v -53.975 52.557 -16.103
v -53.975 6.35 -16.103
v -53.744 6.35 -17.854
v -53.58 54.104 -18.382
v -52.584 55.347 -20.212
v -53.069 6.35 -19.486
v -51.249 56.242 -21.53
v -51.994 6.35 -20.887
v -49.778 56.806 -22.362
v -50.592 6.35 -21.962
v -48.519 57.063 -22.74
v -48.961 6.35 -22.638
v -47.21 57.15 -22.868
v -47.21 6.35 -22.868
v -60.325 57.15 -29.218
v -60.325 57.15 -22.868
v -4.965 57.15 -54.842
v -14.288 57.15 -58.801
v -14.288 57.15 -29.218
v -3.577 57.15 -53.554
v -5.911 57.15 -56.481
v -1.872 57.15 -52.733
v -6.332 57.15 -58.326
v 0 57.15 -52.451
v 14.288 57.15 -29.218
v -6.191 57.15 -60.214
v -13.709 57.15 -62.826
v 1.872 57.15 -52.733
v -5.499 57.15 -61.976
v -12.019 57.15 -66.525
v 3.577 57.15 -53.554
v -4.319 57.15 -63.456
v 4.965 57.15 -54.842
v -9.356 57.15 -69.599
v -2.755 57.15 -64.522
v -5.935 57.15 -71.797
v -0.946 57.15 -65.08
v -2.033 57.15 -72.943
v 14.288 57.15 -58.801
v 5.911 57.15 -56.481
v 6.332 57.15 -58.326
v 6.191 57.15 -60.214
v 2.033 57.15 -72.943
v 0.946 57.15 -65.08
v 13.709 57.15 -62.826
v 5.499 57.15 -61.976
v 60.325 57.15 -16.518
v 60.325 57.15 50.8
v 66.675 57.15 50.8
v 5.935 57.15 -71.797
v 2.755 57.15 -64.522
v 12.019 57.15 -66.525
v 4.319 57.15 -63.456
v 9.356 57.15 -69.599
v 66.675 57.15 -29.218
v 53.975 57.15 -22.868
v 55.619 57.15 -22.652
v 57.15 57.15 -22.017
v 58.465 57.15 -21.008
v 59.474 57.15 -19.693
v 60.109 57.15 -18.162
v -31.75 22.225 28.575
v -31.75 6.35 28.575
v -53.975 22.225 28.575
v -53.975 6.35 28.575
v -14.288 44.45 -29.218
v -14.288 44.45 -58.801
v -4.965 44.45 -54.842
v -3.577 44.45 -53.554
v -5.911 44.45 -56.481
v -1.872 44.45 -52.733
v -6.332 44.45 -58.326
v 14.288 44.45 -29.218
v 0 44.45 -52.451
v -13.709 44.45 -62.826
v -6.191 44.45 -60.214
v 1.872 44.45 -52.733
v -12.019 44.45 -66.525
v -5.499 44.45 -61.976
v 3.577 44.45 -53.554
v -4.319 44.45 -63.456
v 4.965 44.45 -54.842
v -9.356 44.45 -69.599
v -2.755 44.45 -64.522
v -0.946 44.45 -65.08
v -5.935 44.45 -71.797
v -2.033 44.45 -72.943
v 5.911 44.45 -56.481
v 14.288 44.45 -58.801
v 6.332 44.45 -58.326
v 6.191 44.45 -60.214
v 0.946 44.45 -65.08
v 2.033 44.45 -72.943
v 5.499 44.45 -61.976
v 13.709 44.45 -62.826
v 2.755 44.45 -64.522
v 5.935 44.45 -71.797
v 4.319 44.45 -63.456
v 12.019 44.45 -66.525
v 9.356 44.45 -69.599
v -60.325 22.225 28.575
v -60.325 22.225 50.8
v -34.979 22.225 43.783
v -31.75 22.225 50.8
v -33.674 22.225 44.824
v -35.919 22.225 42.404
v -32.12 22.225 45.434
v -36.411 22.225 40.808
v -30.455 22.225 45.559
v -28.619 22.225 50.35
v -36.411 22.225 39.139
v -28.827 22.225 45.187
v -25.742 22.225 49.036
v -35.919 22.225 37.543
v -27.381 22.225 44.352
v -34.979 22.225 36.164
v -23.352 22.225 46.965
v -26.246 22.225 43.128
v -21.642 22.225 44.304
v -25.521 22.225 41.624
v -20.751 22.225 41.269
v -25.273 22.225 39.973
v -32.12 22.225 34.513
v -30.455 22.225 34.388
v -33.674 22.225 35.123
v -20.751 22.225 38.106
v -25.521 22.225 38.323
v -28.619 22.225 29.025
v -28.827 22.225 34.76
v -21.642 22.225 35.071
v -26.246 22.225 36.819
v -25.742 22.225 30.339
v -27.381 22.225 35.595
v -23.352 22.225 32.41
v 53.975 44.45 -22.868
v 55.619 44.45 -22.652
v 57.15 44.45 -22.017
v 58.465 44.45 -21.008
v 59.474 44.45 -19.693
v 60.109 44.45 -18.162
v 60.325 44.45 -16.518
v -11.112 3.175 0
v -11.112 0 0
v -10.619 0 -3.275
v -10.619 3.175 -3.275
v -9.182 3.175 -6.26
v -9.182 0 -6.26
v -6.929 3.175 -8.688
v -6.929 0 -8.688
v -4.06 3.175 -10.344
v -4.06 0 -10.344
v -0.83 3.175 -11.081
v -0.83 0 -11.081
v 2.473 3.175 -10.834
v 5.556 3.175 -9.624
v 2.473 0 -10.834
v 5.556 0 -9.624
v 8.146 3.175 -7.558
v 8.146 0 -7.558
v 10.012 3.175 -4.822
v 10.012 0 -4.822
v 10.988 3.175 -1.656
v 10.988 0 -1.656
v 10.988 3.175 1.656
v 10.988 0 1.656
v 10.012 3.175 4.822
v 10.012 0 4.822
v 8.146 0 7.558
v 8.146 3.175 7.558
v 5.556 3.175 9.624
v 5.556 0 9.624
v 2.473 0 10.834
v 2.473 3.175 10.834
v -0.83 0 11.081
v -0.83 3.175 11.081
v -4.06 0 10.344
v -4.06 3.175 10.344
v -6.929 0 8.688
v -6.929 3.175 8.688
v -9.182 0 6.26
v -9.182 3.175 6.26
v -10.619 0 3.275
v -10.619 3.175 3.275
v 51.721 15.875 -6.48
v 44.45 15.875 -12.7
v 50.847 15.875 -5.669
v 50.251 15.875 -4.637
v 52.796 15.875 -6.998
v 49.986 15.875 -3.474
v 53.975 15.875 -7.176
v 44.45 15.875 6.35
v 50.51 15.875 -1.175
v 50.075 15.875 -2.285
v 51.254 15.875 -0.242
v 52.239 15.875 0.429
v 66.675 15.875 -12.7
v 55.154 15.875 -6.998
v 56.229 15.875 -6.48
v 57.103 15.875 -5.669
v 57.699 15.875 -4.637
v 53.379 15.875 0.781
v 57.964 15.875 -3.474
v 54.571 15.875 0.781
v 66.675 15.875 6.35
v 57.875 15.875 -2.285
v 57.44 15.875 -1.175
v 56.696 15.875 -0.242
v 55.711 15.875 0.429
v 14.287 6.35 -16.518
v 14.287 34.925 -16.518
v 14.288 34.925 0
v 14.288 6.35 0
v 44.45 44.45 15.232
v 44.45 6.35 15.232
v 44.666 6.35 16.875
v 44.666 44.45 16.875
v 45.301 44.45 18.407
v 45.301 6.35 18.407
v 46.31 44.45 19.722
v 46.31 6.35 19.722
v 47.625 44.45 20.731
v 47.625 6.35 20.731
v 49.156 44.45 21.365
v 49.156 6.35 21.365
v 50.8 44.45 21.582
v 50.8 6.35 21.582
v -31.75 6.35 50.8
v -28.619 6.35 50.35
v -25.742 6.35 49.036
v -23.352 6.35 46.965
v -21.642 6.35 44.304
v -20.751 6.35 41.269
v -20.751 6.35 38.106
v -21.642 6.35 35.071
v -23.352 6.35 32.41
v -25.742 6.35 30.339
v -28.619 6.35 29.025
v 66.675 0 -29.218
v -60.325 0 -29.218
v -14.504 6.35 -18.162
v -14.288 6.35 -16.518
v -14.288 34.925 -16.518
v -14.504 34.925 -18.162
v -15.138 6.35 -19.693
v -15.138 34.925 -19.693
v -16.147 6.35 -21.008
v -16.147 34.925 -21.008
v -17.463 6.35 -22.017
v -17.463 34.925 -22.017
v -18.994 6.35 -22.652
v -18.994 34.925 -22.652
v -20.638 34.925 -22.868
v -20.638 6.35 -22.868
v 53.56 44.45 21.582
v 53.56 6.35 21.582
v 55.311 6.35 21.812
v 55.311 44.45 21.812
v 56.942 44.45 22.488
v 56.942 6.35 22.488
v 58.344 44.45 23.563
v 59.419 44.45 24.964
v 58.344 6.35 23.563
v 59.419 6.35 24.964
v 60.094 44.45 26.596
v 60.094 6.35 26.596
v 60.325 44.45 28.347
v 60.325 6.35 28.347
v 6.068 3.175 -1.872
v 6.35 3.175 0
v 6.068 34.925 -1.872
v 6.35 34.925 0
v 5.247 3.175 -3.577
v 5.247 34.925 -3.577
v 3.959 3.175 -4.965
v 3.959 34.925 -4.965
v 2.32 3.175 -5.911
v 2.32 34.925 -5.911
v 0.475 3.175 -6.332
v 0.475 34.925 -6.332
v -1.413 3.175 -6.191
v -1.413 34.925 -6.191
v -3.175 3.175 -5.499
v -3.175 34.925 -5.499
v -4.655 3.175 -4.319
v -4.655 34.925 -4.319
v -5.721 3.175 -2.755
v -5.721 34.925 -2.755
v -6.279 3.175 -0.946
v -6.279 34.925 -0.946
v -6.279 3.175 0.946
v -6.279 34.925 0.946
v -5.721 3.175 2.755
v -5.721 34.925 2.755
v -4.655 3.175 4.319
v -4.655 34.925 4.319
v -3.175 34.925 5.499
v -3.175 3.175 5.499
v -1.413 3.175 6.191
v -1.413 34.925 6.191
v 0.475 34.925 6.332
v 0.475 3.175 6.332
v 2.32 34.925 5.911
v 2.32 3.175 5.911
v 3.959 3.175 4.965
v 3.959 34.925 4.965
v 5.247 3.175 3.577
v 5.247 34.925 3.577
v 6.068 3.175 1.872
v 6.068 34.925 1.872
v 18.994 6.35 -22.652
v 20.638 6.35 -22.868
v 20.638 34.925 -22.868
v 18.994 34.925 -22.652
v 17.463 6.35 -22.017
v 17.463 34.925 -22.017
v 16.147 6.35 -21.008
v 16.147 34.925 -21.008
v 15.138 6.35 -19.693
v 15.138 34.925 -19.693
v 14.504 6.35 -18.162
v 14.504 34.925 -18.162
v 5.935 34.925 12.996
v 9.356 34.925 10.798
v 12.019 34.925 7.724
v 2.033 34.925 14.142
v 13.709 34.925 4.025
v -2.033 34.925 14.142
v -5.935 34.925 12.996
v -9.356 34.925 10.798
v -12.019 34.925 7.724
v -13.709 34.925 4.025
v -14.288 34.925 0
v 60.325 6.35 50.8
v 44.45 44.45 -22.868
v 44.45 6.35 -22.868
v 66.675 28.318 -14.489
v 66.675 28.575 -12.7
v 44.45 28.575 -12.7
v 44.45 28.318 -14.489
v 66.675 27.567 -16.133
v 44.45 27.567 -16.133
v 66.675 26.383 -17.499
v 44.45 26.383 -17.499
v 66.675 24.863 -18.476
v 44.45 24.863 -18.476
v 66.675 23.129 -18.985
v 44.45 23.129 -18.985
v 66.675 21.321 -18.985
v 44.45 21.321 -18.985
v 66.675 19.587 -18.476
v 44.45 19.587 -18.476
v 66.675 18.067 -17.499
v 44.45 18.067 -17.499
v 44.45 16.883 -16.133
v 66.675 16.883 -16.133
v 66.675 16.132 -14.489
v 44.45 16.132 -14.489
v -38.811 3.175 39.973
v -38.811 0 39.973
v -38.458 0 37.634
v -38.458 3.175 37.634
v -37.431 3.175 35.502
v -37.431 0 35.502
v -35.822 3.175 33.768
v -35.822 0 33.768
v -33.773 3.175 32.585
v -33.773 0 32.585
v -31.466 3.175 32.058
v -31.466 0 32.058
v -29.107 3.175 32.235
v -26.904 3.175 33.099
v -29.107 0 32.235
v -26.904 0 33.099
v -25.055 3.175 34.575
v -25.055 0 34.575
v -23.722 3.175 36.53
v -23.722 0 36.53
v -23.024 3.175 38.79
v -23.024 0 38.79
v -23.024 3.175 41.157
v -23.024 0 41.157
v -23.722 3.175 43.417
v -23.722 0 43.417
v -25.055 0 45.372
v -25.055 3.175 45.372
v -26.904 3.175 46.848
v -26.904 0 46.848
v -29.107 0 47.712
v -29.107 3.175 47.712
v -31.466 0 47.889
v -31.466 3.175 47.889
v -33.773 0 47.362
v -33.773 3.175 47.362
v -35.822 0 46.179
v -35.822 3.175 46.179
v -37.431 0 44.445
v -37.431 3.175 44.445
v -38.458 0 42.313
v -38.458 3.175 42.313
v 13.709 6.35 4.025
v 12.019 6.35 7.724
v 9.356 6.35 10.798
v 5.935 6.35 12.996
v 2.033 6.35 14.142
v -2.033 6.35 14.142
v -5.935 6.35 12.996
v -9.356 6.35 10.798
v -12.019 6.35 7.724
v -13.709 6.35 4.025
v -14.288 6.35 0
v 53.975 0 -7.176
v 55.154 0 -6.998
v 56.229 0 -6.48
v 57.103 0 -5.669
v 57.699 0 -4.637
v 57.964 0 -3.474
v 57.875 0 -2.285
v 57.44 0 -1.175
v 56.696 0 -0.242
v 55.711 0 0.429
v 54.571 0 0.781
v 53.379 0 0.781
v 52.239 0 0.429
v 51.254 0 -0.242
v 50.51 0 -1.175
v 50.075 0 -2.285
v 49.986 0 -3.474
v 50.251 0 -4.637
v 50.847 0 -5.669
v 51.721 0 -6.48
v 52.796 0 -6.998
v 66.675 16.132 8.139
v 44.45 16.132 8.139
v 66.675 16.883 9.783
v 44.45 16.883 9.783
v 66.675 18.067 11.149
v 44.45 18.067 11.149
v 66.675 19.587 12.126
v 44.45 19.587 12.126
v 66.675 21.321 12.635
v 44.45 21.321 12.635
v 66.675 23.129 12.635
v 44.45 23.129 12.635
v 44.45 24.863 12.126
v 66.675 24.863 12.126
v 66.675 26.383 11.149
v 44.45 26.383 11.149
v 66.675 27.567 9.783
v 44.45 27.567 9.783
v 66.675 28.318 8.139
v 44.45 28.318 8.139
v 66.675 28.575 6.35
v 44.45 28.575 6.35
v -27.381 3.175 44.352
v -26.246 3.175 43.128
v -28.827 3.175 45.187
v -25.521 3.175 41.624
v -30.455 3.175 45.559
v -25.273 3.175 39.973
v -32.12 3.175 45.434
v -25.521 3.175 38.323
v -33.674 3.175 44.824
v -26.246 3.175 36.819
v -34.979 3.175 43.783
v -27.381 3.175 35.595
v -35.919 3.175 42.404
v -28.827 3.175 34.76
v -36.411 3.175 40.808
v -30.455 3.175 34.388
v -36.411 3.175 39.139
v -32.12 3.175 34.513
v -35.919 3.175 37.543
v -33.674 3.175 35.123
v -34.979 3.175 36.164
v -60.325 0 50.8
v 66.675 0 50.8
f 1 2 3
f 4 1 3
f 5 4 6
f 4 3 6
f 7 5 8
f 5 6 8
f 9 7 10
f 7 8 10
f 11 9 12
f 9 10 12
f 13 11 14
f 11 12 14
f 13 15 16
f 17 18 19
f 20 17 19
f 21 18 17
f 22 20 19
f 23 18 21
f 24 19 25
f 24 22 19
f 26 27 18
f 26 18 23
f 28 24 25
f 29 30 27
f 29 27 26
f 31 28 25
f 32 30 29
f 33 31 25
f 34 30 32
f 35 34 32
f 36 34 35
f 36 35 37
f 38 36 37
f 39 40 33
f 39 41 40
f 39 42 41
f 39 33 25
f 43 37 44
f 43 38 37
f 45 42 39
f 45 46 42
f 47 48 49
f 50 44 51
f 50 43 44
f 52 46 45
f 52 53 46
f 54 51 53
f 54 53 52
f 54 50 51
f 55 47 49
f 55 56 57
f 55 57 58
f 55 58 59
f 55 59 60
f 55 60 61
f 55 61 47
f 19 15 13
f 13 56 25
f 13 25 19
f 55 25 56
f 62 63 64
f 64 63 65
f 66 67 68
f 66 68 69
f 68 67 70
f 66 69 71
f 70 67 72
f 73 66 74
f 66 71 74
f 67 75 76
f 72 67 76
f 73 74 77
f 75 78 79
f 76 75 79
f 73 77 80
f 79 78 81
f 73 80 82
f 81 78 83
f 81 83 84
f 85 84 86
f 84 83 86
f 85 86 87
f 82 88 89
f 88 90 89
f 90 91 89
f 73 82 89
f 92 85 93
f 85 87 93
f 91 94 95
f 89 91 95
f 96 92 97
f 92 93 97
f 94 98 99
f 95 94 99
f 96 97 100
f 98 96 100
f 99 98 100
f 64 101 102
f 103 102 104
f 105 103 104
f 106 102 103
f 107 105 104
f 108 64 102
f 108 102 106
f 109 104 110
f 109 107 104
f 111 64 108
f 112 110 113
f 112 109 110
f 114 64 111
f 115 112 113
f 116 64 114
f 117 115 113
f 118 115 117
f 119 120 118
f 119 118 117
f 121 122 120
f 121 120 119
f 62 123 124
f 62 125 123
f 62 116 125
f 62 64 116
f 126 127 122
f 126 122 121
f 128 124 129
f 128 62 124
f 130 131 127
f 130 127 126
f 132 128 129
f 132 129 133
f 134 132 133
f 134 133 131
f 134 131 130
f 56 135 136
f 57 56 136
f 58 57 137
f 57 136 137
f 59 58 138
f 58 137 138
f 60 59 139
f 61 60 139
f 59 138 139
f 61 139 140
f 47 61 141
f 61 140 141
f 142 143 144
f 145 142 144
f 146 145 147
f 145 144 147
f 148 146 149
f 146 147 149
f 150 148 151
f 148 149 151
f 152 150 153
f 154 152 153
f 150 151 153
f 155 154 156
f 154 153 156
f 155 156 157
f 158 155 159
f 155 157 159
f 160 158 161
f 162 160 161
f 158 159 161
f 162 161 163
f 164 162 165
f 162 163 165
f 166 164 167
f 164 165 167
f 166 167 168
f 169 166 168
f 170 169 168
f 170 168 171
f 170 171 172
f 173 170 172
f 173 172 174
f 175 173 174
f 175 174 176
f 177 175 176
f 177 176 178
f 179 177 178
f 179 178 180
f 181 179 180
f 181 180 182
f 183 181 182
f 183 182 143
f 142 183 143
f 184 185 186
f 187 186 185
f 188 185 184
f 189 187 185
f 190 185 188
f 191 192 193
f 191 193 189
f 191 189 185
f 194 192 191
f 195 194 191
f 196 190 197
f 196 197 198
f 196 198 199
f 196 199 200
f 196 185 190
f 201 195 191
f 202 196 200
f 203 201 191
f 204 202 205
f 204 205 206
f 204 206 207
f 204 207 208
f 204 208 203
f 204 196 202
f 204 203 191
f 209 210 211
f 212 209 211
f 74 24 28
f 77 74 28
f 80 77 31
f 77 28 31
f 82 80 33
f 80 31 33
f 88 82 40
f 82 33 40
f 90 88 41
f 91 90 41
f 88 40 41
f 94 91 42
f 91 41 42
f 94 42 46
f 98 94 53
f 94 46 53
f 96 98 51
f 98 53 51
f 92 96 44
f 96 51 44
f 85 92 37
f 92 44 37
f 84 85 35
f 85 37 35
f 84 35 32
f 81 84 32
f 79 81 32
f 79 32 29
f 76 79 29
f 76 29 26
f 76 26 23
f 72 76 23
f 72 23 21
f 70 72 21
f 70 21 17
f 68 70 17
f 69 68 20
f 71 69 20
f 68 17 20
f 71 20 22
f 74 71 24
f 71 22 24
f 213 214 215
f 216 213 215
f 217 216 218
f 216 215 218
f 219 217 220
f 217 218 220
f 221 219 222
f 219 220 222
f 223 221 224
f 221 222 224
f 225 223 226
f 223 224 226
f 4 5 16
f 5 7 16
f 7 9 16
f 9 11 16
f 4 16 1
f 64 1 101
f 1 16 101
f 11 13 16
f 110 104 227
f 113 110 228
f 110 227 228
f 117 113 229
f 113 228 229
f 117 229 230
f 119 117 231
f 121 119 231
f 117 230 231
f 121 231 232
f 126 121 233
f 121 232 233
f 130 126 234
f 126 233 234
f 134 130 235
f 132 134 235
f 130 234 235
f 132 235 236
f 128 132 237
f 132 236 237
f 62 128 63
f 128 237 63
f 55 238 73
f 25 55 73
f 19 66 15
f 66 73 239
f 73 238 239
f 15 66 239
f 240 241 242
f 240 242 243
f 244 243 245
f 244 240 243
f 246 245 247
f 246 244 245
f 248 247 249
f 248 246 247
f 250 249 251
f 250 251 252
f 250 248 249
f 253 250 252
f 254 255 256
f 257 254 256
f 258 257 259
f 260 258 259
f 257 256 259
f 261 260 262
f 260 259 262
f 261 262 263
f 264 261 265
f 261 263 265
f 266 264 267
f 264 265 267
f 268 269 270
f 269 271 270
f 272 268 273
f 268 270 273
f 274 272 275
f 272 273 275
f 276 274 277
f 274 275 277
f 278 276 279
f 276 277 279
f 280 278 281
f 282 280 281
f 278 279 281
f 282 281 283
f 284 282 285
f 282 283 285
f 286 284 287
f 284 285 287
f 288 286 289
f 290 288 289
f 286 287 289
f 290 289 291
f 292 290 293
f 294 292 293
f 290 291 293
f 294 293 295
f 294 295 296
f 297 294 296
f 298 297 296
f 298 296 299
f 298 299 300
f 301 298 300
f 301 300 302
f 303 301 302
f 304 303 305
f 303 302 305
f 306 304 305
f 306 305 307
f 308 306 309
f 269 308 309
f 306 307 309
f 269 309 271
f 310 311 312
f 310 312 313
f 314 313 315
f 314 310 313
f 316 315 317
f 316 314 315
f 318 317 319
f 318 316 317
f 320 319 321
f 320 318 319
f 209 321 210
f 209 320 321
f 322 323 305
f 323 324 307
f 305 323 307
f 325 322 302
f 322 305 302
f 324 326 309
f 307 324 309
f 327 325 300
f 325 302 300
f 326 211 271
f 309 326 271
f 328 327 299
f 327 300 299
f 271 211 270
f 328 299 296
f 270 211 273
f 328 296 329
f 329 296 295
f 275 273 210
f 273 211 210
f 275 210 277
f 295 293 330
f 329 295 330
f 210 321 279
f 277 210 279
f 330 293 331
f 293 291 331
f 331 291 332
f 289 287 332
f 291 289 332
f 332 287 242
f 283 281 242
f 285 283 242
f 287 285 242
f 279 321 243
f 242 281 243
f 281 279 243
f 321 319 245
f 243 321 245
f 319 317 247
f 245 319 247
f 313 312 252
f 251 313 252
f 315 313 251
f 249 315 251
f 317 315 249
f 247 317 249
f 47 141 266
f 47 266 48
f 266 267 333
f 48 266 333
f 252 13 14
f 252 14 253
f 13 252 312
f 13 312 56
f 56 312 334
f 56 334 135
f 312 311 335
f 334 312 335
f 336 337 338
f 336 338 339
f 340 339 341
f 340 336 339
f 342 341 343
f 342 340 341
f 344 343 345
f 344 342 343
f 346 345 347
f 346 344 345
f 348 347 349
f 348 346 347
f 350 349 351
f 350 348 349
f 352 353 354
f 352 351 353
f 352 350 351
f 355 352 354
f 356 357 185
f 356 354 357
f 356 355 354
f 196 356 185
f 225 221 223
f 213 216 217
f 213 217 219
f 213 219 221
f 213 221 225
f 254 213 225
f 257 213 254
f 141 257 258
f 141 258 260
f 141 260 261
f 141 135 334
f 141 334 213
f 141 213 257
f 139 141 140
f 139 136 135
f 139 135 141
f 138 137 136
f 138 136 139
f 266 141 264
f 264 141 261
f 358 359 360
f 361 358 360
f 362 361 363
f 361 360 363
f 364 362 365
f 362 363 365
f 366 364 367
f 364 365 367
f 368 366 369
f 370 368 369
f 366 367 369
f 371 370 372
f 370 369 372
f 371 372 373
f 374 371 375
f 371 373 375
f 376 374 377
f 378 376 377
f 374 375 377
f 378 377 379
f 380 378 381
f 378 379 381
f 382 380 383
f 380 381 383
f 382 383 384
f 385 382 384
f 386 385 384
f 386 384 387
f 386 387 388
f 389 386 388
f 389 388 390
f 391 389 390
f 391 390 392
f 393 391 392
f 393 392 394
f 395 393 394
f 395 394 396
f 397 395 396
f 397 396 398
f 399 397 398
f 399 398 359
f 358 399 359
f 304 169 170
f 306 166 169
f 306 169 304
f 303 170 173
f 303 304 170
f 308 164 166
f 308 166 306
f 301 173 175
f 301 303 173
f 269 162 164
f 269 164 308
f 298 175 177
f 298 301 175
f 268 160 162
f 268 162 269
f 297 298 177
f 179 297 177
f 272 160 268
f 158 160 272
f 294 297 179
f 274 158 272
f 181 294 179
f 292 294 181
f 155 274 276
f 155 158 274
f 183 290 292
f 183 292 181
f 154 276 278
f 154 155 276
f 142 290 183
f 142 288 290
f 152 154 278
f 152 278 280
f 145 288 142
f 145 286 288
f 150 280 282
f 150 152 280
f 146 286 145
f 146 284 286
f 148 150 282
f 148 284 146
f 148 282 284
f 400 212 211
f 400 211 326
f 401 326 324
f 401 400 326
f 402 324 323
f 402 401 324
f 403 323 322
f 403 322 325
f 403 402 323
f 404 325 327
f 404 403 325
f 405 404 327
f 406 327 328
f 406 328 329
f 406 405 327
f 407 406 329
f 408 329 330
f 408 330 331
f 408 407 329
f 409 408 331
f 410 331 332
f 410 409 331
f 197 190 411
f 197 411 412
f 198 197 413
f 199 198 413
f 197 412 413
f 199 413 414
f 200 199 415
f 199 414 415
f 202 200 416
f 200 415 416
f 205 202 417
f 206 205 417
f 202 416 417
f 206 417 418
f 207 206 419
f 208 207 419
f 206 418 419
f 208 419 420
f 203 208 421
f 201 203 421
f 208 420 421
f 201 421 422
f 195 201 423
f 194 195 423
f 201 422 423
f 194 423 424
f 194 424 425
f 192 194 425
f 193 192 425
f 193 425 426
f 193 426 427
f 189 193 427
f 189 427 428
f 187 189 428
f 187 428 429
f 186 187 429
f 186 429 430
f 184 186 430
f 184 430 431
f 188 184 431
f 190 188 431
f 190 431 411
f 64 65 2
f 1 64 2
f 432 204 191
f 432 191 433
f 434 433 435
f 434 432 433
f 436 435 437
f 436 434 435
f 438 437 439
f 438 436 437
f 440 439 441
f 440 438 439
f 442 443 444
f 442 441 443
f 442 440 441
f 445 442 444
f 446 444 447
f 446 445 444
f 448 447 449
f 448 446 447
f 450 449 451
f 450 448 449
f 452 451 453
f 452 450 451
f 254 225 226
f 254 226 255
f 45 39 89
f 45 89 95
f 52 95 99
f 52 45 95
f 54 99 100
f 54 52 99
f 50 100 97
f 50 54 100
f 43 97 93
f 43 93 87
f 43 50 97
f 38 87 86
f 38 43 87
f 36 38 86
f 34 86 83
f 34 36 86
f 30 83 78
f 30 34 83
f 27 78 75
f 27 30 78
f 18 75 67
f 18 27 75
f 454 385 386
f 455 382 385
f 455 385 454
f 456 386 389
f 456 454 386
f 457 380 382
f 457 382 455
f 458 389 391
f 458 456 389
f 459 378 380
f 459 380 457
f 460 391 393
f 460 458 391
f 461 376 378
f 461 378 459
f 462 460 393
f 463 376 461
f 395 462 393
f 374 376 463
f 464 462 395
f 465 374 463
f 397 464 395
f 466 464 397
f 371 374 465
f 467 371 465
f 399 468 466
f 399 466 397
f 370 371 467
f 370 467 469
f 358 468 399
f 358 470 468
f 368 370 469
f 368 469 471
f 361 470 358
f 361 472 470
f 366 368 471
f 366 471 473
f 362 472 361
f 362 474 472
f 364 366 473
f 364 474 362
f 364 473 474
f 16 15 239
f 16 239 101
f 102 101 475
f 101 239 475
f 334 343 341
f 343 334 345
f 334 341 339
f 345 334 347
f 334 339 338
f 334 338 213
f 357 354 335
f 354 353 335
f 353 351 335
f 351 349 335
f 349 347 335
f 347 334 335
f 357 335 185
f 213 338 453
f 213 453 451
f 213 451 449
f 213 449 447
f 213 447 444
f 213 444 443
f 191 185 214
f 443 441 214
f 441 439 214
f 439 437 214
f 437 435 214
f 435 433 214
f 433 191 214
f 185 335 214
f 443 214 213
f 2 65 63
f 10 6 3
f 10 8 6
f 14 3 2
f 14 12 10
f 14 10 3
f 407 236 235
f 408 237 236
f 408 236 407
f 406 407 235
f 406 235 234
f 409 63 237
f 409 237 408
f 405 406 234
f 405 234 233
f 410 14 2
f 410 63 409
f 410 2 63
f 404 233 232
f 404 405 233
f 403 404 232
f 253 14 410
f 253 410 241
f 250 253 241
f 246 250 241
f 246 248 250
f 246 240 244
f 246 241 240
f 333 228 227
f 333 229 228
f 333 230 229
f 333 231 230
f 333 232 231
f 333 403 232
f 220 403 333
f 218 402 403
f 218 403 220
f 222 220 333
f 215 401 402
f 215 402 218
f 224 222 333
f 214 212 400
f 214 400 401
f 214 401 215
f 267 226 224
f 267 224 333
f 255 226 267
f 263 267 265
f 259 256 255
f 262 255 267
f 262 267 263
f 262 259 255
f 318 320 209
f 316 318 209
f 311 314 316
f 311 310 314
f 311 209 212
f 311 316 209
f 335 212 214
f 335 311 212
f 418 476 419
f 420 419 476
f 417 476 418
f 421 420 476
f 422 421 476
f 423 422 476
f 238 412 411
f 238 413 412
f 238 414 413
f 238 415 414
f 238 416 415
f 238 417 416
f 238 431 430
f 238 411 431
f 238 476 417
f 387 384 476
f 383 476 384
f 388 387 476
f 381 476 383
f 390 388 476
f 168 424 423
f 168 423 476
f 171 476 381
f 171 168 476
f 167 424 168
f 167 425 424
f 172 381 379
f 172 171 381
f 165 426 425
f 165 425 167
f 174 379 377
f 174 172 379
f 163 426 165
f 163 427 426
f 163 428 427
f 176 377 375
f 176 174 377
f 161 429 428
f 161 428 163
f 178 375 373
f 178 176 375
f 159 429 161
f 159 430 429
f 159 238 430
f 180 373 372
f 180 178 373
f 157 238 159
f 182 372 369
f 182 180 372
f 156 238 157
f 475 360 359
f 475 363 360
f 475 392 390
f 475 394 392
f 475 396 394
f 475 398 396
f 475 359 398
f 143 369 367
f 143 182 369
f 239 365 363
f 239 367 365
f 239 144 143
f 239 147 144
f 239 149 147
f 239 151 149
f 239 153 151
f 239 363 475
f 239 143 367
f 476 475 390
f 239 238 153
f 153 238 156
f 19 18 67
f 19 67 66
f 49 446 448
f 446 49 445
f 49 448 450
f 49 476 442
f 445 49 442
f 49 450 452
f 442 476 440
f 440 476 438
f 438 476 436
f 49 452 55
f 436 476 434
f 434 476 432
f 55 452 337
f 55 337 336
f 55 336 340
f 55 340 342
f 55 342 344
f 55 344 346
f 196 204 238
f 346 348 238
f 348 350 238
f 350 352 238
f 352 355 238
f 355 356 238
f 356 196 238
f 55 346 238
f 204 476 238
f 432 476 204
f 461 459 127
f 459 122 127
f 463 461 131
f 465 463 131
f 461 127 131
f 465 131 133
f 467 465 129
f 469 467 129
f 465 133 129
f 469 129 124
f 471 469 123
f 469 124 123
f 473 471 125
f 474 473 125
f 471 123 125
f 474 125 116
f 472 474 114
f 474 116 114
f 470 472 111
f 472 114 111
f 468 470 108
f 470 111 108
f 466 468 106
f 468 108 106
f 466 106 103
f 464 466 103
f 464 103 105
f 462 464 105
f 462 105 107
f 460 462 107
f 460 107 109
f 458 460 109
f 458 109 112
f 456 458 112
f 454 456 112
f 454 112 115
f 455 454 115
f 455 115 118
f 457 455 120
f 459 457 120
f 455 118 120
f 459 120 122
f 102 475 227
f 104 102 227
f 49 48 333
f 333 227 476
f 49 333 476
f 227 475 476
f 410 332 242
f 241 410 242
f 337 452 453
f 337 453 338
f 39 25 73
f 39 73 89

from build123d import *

# Parameters (mm, degrees)
BOSS_EXTRUDE1_DEPTH                                  = 6.35
BOSS_EXTRUDE2_DEPTH                                  = 57.15
BOSS_EXTRUDE3_DEPTH                                  = 44.45
BOSS_EXTRUDE4_DEPTH                                  = 34.925
SKETCH4_R                                            = 14.2875
SKETCH4_R_2                                          = 6.35
BOSS_EXTRUDE5_DEPTH                                  = 12.7
CUT_EXTRUDE1_REACH                                   = 159.28
BOSS_EXTRUDE6_DEPTH                                  = 15.875
CBORE_FOR_M5_CROSS_RECESS_PAN_HEAD_SCREW_D           = 11.2014
CBORE_FOR_M5_CROSS_RECESS_PAN_HEAD_SCREW_CBORE_D     = 15.875
CBORE_FOR_M5_CROSS_RECESS_PAN_HEAD_SCREW_CBORE_DEPTH = 3.175
CBORE_FOR_M5_CROSS_RECESS_PAN_HEAD_S_2_D             = 12.7
CBORE_FOR_M5_CROSS_RECESS_PAN_HEAD_S_2_CBORE_D       = 22.225
CBORE_FOR_M5_CROSS_RECESS_PAN_HEAD_S_2_CBORE_DEPTH   = 3.175
CUT_EXTRUDE3_REACH                                   = 159.28
CUT_EXTRUDE4_REACH                                   = 116.252
SKETCH18_R                                           = 4.0005


with BuildPart() as part:
    # Sketch1 → Boss-Extrude1 (new body)
    with BuildSketch(Plane(origin=(0, 0, 0), x_dir=(1, 0, 0), z_dir=(0, 1, 0))):
        with BuildLine():
            Line((60.325, 16.51822322), (60.325, -28.346886894))
            Line((60.325, -28.346886894), (60.325, -50.8))
            Line((60.325, -50.8), (66.675, -50.8))
            Line((66.675, -50.8), (66.675, 29.21822322))
            Line((66.675, 29.21822322), (-60.325, 29.21822322))
            Line((-60.325, 29.21822322), (-60.325, -50.8))
            Line((-60.325, -50.8), (-53.975, -50.8))
            Line((-53.975, -50.8), (-53.975, -44.45))
            Line((-53.975, -44.45), (-53.975, 16.103113106))
            ThreePointArc((-53.975, 16.103113106), (-51.993545123, 20.886768343), (-47.209889886, 22.86822322))
            Line((-47.209889886, 22.86822322), (-20.6375, 22.86822322))
            Line((-20.6375, 22.86822322), (20.6375, 22.86822322))
            Line((20.6375, 22.86822322), (44.45, 22.86822322))
            Line((44.45, 22.86822322), (53.975, 22.86822322))
            ThreePointArc((53.975, 22.86822322), (58.465128061, 21.00835128), (60.325, 16.51822322))
        make_face()
        with BuildLine():
            Line((60.325, -50.8), (60.325, -28.346886894))
            ThreePointArc((60.325, -28.346886894), (58.343545123, -23.563231657), (53.559889886, -21.58177678))
            Line((53.559889886, -21.58177678), (50.8, -21.58177678))
            ThreePointArc((50.8, -21.58177678), (46.309871939, -19.721904841), (44.45, -15.23177678))
            Line((44.45, -15.23177678), (44.45, 22.86822322))
            Line((44.45, 22.86822322), (20.6375, 22.86822322))
            ThreePointArc((20.6375, 22.86822322), (16.147371939, 21.00835128), (14.2875, 16.51822322))
            Line((14.2875, 16.51822322), (14.2875, 0))
            ThreePointArc((14.2875, 0), (0, -14.2875), (-14.2875, 0))
            Line((-14.2875, 0), (-14.2875, 16.51822322))
            ThreePointArc((-14.2875, 16.51822322), (-16.147371939, 21.00835128), (-20.6375, 22.86822322))
            Line((-20.6375, 22.86822322), (-47.209889886, 22.86822322))
            ThreePointArc((-47.209889886, 22.86822322), (-51.993545123, 20.886768343), (-53.975, 16.103113106))
            Line((-53.975, 16.103113106), (-53.975, -44.45))
            Line((-53.975, -44.45), (-53.975, -50.8))
            Line((-53.975, -50.8), (-47.625, -50.8))
            Line((-47.625, -50.8), (60.325, -50.8))
        make_face()
        with BuildLine():
            Line((-20.6375, 22.86822322), (20.6375, 22.86822322))
            ThreePointArc((20.6375, 22.86822322), (16.147371939, 21.00835128), (14.2875, 16.51822322))
            Line((14.2875, 16.51822322), (14.2875, 0))
            ThreePointArc((14.2875, 0), (0, -14.2875), (-14.2875, 0))
            Line((-14.2875, 0), (-14.2875, 16.51822322))
            ThreePointArc((-14.2875, 16.51822322), (-16.147371939, 21.00835128), (-20.6375, 22.86822322))
        make_face()
        with BuildLine():
            ThreePointArc((53.559889886, -21.58177678), (58.343545123, -23.563231657), (60.325, -28.346886894))
            Line((60.325, -28.346886894), (60.325, 16.51822322))
            ThreePointArc((60.325, 16.51822322), (58.465128061, 21.00835128), (53.975, 22.86822322))
            Line((53.975, 22.86822322), (44.45, 22.86822322))
            Line((44.45, 22.86822322), (44.45, -15.23177678))
            ThreePointArc((44.45, -15.23177678), (46.309871939, -19.721904841), (50.8, -21.58177678))
            Line((50.8, -21.58177678), (53.559889886, -21.58177678))
        make_face()
    extrude(amount=BOSS_EXTRUDE1_DEPTH)

    # Sketch1<4> → Boss-Extrude2 (add)
    with BuildSketch(Plane(origin=(0, 0, 0), x_dir=(1, 0, 0), z_dir=(0, 1, 0))):
        with BuildLine():
            Line((60.325, 16.51822322), (60.325, -28.346886894))
            Line((60.325, -28.346886894), (60.325, -50.8))
            Line((60.325, -50.8), (66.675, -50.8))
            Line((66.675, -50.8), (66.675, 29.21822322))
            Line((66.675, 29.21822322), (-60.325, 29.21822322))
            Line((-60.325, 29.21822322), (-60.325, -50.8))
            Line((-60.325, -50.8), (-53.975, -50.8))
            Line((-53.975, -50.8), (-53.975, -44.45))
            Line((-53.975, -44.45), (-53.975, 16.103113106))
            ThreePointArc((-53.975, 16.103113106), (-51.993545123, 20.886768343), (-47.209889886, 22.86822322))
            Line((-47.209889886, 22.86822322), (-20.6375, 22.86822322))
            Line((-20.6375, 22.86822322), (20.6375, 22.86822322))
            Line((20.6375, 22.86822322), (44.45, 22.86822322))
            Line((44.45, 22.86822322), (53.975, 22.86822322))
            ThreePointArc((53.975, 22.86822322), (58.465128061, 21.00835128), (60.325, 16.51822322))
        make_face()
    extrude(amount=BOSS_EXTRUDE2_DEPTH)

    # Sketch1<5> → Boss-Extrude3 (add)
    with BuildSketch(Plane(origin=(0, 0, 0), x_dir=(1, 0, 0), z_dir=(0, 1, 0))):
        with BuildLine():
            ThreePointArc((53.559889886, -21.58177678), (58.343545123, -23.563231657), (60.325, -28.346886894))
            Line((60.325, -28.346886894), (60.325, 16.51822322))
            ThreePointArc((60.325, 16.51822322), (58.465128061, 21.00835128), (53.975, 22.86822322))
            Line((53.975, 22.86822322), (44.45, 22.86822322))
            Line((44.45, 22.86822322), (44.45, -15.23177678))
            ThreePointArc((44.45, -15.23177678), (46.309871939, -19.721904841), (50.8, -21.58177678))
            Line((50.8, -21.58177678), (53.559889886, -21.58177678))
        make_face()
    extrude(amount=BOSS_EXTRUDE3_DEPTH)

    # Sketch1<6> → Boss-Extrude4 (add)
    with BuildSketch(Plane(origin=(0, 0, 0), x_dir=(1, 0, 0), z_dir=(0, 1, 0))):
        with BuildLine():
            Line((-20.6375, 22.86822322), (20.6375, 22.86822322))
            ThreePointArc((20.6375, 22.86822322), (16.147371939, 21.00835128), (14.2875, 16.51822322))
            Line((14.2875, 16.51822322), (14.2875, 0))
            ThreePointArc((14.2875, 0), (0, -14.2875), (-14.2875, 0))
            Line((-14.2875, 0), (-14.2875, 16.51822322))
            ThreePointArc((-14.2875, 16.51822322), (-16.147371939, 21.00835128), (-20.6375, 22.86822322))
        make_face()
    extrude(amount=BOSS_EXTRUDE4_DEPTH)

    # Sketch4 → Boss-Extrude5 (add)
    # profile 1 of 2: a face of its own
    with BuildSketch(Plane(origin=(0, 57.15, 0), x_dir=(1, 0, 0), z_dir=(0, 1, 0))):
        with BuildLine():
            ThreePointArc((14.2875, 58.801), (0, 44.5135), (-14.2875, 58.801))
            Line((-14.2875, 58.801), (-14.2875, 29.21822322))
            Line((-14.2875, 29.21822322), (14.2875, 29.21822322))
            Line((14.2875, 29.21822322), (14.2875, 58.801))
        make_face()
    # profile 2 of 2: a face of its own
    with BuildSketch(Plane(origin=(0, 57.15, 0), x_dir=(1, 0, 0), z_dir=(0, 1, 0))):
        with Locations((0, 58.801)):
            Circle(SKETCH4_R)
        with Locations(Location((0, 58.801, 0), (0, 0, 270))):
            Circle(SKETCH4_R_2, mode=Mode.SUBTRACT)
    extrude(amount=-BOSS_EXTRUDE5_DEPTH)

    # Sketch5 → Cut-Extrude1 (cut, up to next)
    with BuildSketch(Plane.ZY.offset(60.325), mode=Mode.PRIVATE) as cut_extrude1_sk1:
        Polygon((-22.86822322, 57.15), (28.575, 22.225), (50.8, 22.225), (50.8, 57.15), align=None)
    cut_extrude1_tool1 = extrude(cut_extrude1_sk1.sketch, amount=-CUT_EXTRUDE1_REACH, mode=Mode.PRIVATE) & part.part
    add(cut_extrude1_tool1.solids().sort_by_distance((-60.325, 42.810165, 24.526909))[0], mode=Mode.SUBTRACT)

    # Sketch6 → Boss-Extrude6 (add)
    with BuildSketch(Plane(origin=(0, 6.35, 0), x_dir=(1, 0, 0), z_dir=(0, 1, 0))):
        with BuildLine():
            Line((-31.75, -28.575), (-53.975, -28.575))
            Line((-53.975, -28.575), (-53.975, -50.8))
            Line((-53.975, -50.8), (-31.75, -50.8))
            ThreePointArc((-31.75, -50.8), (-20.6375, -39.6875), (-31.75, -28.575))
        make_face()
    extrude(amount=BOSS_EXTRUDE6_DEPTH)

    # CBORE for M5 Cross Recess Pan Head Screw (through all)
    with Locations(Plane(origin=(0, 0, 0), x_dir=(-1, 0, 0), z_dir=(0, -1, 0))):
        with Locations((30.873227599, -39.973489035)):
            CounterBoreHole(CBORE_FOR_M5_CROSS_RECESS_PAN_HEAD_SCREW_D / 2, CBORE_FOR_M5_CROSS_RECESS_PAN_HEAD_SCREW_CBORE_D / 2, CBORE_FOR_M5_CROSS_RECESS_PAN_HEAD_SCREW_CBORE_DEPTH)

    # CBORE for M5 Cross Recess Pan Head S 2 (through all)
    with Locations(Plane(origin=(0, 0, 0), x_dir=(-1, 0, 0), z_dir=(0, -1, 0))):
        with Locations((0, 0)):
            CounterBoreHole(CBORE_FOR_M5_CROSS_RECESS_PAN_HEAD_S_2_D / 2, CBORE_FOR_M5_CROSS_RECESS_PAN_HEAD_S_2_CBORE_D / 2, CBORE_FOR_M5_CROSS_RECESS_PAN_HEAD_S_2_CBORE_DEPTH)

    # Sketch16 → Cut-Extrude3 (cut, up to next)
    with BuildSketch(Plane(origin=(66.675, 0, 0), x_dir=(0, 0, -1), z_dir=(1, 0, 0)), mode=Mode.PRIVATE) as cut_extrude3_sk1:
        with BuildLine():
            Line((-6.35, 28.575), (12.7, 28.575))
            ThreePointArc((12.7, 28.575), (19.05, 22.225), (12.7, 15.875))
            Line((12.7, 15.875), (-6.35, 15.875))
            ThreePointArc((-6.35, 15.875), (-12.7, 22.225), (-6.35, 28.575))
        make_face()
    cut_extrude3_tool1 = extrude(cut_extrude3_sk1.sketch, amount=-CUT_EXTRUDE3_REACH, mode=Mode.PRIVATE) & part.part
    add(cut_extrude3_tool1.solids().sort_by_distance((66.675, 22.225, -3.175))[0], mode=Mode.SUBTRACT)

    # Sketch18 → Cut-Extrude4 (cut, up to next)
    with BuildSketch(Plane(origin=(0, 0, 0), x_dir=(-1, 0, 0), z_dir=(0, -1, 0)), mode=Mode.PRIVATE) as cut_extrude4_sk1:
        with Locations(Location((-53.975, 3.175, 0), (0, 0, 90))):
            Circle(SKETCH18_R)
    cut_extrude4_tool1 = extrude(cut_extrude4_sk1.sketch, amount=-CUT_EXTRUDE4_REACH, mode=Mode.PRIVATE) & part.part
    add(cut_extrude4_tool1.solids().sort_by_distance((53.975, 0, -3.175))[0], mode=Mode.SUBTRACT)


solid = part.part
